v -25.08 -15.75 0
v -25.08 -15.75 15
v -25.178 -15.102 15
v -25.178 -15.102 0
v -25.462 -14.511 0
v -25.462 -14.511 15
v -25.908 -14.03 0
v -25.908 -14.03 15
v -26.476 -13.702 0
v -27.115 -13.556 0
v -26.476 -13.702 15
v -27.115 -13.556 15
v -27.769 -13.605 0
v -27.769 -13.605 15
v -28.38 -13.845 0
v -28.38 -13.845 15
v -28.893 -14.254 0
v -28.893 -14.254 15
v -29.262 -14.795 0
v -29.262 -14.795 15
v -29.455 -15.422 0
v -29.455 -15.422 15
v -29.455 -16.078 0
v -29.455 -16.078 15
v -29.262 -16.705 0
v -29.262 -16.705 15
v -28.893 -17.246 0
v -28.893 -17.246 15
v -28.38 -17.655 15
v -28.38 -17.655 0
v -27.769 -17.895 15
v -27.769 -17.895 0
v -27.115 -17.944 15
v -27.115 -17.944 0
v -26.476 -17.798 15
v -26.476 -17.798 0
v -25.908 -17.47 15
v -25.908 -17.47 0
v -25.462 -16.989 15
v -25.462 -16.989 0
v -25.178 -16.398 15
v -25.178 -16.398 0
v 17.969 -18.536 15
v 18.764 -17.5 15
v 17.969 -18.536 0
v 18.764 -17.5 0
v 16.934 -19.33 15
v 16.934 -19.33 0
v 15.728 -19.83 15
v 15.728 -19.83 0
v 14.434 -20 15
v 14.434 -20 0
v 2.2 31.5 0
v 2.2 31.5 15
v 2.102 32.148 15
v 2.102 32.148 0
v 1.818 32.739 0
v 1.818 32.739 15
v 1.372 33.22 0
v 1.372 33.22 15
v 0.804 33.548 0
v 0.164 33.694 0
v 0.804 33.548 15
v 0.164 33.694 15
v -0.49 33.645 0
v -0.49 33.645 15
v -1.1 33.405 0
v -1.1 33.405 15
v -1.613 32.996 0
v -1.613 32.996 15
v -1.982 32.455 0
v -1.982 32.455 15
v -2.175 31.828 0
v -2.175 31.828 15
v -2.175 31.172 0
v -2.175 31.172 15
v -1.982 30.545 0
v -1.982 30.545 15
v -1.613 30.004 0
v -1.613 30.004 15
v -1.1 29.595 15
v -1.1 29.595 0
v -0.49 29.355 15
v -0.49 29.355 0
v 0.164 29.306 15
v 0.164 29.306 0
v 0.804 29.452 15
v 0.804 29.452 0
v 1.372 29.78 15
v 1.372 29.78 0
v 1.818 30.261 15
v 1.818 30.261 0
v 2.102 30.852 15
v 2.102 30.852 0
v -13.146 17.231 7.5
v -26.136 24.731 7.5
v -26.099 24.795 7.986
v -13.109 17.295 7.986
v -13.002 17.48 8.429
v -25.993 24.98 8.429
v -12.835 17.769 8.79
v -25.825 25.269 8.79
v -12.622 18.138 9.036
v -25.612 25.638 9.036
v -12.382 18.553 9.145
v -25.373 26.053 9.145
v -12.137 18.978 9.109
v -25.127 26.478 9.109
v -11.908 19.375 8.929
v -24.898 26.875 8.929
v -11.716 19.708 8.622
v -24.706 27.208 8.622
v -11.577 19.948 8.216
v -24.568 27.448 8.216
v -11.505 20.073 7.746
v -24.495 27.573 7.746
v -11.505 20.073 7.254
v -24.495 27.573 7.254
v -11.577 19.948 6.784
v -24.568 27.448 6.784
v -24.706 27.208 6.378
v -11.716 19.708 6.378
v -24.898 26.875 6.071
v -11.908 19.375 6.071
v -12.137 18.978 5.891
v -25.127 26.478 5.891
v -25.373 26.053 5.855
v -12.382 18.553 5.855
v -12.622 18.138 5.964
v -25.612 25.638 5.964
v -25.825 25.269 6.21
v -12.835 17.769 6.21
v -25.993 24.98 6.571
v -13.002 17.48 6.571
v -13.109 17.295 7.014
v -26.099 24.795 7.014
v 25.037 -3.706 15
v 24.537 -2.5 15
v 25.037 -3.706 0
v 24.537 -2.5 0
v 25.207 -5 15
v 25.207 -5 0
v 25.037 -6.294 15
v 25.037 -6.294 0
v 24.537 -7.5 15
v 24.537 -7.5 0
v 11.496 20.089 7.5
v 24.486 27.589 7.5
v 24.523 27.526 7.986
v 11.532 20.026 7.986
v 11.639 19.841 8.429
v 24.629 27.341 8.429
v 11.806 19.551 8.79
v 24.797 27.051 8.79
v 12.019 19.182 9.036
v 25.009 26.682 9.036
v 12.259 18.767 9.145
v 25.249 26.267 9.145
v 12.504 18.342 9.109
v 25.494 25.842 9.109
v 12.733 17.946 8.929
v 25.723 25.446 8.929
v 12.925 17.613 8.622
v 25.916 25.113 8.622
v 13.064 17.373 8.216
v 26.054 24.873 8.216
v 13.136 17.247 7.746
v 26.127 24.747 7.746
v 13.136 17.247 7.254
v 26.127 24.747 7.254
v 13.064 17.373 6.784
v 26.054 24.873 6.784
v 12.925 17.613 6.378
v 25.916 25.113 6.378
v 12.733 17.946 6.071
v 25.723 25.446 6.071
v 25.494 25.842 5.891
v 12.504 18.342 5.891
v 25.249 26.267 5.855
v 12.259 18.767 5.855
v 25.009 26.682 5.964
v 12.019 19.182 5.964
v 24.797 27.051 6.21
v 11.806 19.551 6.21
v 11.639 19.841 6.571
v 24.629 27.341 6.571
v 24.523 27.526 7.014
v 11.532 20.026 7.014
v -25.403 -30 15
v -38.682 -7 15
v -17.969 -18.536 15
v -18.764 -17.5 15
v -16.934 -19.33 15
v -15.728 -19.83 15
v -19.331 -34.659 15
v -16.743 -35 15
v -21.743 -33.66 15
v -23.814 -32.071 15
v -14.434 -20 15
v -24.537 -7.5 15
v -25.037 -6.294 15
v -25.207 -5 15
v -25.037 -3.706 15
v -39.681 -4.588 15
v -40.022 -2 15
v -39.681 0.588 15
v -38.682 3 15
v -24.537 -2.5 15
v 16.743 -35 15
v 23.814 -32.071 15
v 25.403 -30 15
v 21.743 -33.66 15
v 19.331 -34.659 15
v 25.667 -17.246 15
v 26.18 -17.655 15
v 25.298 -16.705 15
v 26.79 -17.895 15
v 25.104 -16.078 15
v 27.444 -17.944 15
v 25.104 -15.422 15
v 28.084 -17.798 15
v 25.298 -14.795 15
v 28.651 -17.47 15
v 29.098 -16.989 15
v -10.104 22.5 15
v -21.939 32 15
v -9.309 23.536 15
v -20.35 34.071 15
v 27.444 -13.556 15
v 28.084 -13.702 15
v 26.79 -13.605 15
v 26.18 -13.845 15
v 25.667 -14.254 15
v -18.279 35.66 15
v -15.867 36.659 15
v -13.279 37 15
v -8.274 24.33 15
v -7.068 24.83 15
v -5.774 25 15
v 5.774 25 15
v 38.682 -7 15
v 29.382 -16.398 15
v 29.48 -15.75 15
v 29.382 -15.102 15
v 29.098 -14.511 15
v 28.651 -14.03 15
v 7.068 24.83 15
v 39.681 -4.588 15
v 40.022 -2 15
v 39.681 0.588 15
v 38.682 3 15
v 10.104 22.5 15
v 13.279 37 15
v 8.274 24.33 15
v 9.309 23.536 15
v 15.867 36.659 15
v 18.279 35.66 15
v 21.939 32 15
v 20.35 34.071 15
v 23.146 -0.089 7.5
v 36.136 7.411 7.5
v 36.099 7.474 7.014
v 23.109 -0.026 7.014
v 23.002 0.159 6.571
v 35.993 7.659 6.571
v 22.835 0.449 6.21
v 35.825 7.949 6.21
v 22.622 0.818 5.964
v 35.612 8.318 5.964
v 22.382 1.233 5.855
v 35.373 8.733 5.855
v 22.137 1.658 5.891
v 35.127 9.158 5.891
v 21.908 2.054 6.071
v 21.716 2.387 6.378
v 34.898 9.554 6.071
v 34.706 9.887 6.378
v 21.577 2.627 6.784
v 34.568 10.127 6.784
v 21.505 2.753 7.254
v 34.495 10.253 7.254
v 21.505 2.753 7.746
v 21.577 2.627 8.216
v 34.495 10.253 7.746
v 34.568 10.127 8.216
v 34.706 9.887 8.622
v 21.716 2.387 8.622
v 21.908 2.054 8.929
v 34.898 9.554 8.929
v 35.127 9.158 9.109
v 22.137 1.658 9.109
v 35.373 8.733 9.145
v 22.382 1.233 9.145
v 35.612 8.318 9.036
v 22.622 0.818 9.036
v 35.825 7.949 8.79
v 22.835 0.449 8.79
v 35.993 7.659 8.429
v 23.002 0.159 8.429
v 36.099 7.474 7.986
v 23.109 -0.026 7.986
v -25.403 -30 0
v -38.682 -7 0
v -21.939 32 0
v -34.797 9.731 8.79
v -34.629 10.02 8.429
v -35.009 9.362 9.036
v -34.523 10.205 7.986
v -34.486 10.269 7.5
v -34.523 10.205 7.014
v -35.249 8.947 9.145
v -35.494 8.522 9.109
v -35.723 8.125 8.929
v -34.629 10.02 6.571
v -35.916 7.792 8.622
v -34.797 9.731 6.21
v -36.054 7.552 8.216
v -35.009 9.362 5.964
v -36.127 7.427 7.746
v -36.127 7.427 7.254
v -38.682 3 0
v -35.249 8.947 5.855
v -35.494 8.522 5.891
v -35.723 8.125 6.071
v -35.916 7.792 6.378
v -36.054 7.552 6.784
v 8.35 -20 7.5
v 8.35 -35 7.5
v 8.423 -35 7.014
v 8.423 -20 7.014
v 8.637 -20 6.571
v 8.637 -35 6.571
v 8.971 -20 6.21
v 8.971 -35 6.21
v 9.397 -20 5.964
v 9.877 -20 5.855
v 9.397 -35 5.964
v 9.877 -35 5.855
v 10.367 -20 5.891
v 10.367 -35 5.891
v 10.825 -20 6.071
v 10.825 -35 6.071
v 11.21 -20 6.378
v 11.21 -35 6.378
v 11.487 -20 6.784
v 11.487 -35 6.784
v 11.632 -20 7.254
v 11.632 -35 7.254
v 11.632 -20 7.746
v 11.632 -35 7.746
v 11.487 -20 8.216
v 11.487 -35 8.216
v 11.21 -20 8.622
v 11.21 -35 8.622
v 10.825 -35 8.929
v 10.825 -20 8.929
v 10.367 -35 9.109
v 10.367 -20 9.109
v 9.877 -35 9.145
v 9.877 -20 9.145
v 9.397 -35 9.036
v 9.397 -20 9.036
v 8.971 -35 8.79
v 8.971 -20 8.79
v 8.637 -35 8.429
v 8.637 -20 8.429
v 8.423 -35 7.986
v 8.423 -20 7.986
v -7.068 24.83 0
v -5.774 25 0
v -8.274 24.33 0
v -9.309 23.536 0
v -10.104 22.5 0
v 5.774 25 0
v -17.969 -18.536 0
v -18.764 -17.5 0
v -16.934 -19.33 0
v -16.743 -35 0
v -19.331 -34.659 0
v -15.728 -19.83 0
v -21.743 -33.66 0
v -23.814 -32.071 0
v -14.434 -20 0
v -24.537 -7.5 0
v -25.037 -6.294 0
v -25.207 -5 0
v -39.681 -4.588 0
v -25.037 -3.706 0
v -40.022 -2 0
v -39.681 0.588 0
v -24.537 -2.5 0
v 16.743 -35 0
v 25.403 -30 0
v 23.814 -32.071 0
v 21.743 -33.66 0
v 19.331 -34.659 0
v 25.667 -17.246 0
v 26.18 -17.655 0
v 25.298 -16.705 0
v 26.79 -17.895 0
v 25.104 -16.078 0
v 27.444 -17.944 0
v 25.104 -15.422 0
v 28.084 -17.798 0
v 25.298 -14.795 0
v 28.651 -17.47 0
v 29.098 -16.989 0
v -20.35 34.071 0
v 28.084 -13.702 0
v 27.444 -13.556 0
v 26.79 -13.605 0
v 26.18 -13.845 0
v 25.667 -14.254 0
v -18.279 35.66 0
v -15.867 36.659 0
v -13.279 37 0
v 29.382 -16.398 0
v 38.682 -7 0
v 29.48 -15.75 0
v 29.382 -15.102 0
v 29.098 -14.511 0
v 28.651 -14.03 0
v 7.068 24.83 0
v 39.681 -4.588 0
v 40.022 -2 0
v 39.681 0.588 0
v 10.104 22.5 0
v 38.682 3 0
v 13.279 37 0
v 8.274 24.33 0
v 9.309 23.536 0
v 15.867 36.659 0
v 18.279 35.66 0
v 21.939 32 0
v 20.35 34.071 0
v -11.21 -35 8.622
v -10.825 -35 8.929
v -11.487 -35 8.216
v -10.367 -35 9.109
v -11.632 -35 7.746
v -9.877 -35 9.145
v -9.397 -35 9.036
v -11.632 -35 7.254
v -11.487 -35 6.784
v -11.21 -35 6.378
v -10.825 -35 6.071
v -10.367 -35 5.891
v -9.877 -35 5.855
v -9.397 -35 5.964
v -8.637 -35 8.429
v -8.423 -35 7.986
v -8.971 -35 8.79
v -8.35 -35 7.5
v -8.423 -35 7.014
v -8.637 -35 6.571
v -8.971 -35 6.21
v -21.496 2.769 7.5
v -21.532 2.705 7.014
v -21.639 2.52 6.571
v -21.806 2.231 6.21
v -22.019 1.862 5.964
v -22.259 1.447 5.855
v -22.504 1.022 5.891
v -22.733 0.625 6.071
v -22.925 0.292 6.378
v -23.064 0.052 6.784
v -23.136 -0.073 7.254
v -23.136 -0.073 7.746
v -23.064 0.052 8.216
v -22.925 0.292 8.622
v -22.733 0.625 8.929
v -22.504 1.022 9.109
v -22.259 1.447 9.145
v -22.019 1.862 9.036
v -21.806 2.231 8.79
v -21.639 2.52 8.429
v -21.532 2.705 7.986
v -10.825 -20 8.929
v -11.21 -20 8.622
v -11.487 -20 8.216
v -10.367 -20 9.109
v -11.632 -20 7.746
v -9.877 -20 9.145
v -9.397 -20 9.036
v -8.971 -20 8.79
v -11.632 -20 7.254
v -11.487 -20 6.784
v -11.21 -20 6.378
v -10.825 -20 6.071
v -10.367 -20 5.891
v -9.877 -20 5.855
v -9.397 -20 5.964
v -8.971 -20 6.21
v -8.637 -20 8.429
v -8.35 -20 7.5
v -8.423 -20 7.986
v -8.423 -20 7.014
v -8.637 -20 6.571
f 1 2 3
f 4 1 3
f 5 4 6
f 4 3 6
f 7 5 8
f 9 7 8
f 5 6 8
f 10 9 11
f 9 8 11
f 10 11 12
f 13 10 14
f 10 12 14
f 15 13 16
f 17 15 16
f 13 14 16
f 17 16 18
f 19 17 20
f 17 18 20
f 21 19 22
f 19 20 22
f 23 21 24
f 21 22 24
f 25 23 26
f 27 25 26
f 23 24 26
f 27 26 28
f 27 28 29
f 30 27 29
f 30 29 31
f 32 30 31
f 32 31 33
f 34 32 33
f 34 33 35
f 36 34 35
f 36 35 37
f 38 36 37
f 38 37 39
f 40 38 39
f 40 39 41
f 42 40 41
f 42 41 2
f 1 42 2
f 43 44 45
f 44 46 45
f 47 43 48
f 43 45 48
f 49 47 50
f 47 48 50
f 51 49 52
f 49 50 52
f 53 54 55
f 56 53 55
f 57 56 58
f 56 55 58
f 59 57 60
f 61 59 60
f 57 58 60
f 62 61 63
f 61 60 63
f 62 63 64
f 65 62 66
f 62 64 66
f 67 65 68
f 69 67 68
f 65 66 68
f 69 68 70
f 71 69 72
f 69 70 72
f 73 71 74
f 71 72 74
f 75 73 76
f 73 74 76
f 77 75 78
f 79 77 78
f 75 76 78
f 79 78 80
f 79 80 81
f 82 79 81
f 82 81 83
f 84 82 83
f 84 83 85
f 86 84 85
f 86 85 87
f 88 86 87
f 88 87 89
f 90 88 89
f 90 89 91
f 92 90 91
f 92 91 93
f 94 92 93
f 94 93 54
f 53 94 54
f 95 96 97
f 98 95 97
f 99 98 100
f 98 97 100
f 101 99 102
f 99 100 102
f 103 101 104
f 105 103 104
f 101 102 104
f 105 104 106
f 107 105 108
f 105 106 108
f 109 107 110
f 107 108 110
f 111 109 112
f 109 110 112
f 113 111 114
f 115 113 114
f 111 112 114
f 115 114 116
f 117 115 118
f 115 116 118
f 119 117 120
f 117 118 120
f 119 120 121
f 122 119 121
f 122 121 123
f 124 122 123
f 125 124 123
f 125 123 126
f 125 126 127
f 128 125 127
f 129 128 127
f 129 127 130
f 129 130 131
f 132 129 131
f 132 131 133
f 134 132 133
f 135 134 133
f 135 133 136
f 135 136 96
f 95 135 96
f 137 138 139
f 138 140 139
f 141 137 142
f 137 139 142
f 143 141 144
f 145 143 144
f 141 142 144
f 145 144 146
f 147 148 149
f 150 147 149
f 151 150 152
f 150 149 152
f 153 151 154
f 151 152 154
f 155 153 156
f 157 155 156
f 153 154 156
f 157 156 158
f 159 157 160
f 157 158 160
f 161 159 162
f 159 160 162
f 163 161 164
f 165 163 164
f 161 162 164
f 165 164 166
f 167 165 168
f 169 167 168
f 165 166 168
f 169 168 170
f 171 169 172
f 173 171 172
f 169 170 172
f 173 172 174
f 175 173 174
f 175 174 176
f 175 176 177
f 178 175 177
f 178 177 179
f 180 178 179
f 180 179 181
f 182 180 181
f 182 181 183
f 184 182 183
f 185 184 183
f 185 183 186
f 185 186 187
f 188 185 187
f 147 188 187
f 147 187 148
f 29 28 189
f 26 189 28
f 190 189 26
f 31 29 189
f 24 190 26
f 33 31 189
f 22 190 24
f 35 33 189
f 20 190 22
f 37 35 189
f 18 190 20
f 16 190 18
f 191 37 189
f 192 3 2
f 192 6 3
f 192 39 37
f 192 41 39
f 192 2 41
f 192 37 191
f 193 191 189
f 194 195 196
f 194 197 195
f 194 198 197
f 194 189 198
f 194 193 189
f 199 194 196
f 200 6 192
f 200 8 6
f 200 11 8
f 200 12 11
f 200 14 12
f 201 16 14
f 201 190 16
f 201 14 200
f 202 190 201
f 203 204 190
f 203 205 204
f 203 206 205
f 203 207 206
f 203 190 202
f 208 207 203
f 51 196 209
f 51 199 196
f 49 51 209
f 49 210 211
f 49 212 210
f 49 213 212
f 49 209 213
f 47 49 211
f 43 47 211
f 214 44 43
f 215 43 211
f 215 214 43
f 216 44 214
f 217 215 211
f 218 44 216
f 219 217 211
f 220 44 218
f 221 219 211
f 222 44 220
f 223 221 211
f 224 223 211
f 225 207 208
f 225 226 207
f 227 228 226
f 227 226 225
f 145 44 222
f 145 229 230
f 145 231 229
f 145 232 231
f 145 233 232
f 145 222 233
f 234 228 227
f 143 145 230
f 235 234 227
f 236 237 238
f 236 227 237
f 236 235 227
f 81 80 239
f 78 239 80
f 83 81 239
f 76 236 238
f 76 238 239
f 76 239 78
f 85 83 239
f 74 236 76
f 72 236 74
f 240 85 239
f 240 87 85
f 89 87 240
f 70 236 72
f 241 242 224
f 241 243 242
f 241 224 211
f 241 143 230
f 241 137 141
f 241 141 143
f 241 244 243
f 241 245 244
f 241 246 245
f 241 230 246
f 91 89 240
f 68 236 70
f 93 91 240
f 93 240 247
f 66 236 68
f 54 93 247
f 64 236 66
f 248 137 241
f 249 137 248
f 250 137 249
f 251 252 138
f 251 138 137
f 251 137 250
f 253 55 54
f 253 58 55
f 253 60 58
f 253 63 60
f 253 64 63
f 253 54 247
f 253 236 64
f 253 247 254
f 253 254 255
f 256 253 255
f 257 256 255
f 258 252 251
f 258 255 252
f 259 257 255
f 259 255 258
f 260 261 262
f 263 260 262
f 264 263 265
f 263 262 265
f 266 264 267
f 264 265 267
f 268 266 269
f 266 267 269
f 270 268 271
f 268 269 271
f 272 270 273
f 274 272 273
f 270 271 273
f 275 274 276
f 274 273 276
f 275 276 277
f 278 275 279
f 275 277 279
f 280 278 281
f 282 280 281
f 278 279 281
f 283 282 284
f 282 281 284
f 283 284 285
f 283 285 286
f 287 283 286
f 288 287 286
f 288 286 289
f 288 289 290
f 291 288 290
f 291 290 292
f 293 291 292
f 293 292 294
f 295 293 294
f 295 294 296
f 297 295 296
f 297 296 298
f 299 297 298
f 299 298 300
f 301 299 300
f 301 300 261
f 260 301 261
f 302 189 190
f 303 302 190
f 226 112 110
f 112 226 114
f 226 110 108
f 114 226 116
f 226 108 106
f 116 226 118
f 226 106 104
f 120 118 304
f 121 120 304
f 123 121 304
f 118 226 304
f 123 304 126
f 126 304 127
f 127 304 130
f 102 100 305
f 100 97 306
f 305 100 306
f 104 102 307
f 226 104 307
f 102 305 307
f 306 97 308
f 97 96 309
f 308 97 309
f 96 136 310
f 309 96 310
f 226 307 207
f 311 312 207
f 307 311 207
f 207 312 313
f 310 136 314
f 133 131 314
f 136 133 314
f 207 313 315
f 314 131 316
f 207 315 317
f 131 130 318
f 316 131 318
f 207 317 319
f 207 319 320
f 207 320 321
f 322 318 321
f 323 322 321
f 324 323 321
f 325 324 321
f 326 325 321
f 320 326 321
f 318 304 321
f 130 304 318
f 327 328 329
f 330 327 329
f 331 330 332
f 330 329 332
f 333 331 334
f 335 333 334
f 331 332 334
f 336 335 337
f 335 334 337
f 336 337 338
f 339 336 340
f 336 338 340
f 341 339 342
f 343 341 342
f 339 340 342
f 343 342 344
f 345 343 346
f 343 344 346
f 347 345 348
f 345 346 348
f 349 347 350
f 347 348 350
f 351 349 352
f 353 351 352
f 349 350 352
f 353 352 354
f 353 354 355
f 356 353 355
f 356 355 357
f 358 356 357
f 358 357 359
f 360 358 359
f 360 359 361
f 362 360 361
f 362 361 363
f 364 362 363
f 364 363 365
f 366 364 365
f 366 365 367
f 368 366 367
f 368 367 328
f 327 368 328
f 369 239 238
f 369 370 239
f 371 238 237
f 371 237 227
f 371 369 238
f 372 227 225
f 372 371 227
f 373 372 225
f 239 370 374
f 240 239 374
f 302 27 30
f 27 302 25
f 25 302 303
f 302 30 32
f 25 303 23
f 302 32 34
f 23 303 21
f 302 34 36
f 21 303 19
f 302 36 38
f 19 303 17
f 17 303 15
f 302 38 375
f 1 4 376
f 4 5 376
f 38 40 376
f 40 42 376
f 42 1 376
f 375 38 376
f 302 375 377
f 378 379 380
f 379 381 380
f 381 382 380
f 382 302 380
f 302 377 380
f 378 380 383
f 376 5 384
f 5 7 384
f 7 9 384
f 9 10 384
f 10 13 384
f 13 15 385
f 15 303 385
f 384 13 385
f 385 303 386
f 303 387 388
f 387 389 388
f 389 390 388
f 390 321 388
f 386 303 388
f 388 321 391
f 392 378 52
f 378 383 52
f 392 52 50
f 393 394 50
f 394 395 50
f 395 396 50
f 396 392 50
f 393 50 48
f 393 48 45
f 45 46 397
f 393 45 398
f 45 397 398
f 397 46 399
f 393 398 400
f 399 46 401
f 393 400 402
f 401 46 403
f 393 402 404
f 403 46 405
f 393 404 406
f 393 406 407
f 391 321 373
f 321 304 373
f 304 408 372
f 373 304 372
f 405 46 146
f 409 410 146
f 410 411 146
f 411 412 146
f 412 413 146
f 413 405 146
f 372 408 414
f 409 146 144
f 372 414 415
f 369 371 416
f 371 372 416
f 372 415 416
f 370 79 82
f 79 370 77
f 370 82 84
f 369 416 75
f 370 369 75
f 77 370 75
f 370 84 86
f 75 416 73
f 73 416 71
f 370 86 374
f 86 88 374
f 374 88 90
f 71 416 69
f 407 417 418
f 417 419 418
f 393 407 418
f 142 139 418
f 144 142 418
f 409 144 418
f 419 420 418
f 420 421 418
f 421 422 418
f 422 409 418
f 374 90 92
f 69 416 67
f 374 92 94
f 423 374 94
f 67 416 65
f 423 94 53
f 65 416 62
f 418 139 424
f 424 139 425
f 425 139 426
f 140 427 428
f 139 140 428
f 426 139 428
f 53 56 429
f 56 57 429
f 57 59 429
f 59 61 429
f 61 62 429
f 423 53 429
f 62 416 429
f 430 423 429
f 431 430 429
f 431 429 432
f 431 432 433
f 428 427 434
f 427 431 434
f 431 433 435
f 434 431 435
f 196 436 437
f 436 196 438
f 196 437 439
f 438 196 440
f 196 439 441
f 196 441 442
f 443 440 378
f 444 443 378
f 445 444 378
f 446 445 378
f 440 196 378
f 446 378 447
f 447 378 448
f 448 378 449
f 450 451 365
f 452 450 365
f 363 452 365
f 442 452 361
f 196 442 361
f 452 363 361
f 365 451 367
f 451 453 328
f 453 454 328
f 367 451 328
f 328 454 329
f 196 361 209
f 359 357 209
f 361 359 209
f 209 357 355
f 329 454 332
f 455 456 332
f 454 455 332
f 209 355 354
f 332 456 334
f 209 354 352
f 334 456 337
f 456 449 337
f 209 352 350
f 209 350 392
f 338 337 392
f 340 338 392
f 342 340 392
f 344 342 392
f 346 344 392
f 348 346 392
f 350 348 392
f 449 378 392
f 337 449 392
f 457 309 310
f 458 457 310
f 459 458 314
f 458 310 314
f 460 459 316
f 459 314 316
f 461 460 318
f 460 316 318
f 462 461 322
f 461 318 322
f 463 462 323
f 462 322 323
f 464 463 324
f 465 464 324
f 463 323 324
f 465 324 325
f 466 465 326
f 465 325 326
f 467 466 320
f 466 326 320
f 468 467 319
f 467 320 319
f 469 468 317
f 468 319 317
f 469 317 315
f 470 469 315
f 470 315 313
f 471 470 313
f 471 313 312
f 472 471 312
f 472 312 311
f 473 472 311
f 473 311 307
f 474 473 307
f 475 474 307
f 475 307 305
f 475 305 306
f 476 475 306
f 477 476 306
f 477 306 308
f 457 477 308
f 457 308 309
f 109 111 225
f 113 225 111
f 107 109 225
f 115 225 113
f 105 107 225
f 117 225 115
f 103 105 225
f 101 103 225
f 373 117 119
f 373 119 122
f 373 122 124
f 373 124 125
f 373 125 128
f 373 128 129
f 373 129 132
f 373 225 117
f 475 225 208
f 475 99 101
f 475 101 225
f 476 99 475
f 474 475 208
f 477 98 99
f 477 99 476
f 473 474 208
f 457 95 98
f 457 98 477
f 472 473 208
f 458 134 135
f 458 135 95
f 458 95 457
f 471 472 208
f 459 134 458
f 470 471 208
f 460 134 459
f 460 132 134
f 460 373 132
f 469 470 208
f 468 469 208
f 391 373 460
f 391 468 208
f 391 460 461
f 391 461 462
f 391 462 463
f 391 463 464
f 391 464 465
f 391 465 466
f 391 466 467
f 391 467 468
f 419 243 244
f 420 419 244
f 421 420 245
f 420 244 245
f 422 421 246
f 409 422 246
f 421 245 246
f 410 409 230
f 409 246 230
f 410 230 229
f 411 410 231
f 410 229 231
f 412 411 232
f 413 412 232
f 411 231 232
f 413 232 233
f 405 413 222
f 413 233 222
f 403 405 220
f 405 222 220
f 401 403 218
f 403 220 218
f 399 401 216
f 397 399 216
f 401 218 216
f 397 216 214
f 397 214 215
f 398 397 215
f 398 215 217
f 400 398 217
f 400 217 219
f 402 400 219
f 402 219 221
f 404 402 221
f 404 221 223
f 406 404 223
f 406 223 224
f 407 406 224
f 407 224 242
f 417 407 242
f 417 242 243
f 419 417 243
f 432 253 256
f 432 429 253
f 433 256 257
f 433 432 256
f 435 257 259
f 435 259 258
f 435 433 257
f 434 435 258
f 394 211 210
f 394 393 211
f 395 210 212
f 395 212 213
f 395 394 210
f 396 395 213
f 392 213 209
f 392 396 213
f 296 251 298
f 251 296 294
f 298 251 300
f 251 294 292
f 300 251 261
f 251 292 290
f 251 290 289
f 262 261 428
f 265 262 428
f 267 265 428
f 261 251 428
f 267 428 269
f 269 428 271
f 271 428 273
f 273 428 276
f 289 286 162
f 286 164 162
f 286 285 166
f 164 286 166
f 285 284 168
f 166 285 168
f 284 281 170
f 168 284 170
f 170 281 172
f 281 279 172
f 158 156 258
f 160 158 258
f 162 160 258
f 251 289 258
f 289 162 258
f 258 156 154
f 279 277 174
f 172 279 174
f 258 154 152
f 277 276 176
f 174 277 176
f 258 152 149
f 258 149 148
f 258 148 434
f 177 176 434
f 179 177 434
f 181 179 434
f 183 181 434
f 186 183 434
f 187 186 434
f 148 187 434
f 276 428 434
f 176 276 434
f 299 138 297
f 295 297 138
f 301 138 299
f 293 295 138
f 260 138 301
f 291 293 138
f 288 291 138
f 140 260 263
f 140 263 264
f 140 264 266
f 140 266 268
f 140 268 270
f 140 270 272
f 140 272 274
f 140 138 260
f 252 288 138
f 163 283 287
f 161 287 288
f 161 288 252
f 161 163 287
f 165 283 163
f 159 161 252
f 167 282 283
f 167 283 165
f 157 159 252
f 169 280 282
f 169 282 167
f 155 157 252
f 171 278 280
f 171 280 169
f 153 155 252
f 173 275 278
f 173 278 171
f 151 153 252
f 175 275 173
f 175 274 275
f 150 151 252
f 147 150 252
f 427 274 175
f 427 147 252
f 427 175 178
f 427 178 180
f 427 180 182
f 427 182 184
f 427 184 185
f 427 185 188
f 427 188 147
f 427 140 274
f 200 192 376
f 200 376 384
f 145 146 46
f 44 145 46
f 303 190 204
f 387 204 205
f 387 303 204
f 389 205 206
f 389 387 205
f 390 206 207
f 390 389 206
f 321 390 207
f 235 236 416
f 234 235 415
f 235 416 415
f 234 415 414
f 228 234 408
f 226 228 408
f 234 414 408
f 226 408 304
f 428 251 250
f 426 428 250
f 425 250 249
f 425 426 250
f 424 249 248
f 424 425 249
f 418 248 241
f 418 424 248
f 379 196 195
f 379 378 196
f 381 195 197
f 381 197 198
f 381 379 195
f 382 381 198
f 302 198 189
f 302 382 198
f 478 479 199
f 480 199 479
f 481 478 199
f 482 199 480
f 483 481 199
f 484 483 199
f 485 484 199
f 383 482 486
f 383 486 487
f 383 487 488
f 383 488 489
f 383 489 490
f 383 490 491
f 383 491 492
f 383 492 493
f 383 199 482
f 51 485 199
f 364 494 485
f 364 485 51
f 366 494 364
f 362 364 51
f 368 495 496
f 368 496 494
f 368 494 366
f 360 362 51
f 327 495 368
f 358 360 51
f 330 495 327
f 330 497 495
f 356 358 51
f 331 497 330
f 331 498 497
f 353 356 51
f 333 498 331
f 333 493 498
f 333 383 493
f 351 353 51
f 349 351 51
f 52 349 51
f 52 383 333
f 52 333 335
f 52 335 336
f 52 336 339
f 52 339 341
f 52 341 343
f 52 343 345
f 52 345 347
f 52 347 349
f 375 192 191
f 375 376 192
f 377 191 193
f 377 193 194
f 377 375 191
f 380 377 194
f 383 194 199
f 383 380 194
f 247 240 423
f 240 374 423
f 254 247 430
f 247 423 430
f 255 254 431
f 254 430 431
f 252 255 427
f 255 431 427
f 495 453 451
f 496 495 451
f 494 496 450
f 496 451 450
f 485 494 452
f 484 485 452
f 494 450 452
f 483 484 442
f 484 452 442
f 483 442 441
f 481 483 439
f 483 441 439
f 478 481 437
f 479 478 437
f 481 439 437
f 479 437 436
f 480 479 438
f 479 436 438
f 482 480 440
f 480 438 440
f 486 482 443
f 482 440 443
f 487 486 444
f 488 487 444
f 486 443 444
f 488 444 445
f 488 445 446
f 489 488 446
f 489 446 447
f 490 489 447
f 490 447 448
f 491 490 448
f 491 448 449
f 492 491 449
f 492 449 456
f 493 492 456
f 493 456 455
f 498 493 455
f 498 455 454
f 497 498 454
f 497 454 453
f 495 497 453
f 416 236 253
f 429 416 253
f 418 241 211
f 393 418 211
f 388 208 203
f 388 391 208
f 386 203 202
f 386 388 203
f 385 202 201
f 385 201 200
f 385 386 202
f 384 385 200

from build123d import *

# Parameters (mm, degrees)
EXTRUDE_1_DEPTH     = 15
FILLET_1_R          = 10
FILLET_2_R          = 5
SKETCH_2_R          = 1.65
CUT_EXTRUDE_1_DEPTH = 20
SKETCH_4_R          = 1.65
CUT_EXTRUDE_2_DEPTH = 20
SKETCH_5_R          = 1.65
CUT_EXTRUDE_3_DEPTH = 20
CUT_EXTRUDE_4_DEPTH = 15
EXTRUDE_2_DEPTH     = 15
CUT_EXTRUDE_5_DEPTH = 61.827625303
FILLET_3_R          = 10
FILLET_4_R          = 5
SKETCH_9_R          = 2.2
CUT_EXTRUDE_6_DEPTH = 57.531209197


with BuildPart() as part:
    # 草图1 → 凸台-拉伸1 (new body)
    with BuildSketch(Plane.XY):
        Polygon((0, 70), (-60.621778265, -35), (60.621778265, -35), align=None)
        Polygon((0, 40), (-34.641016151, -20), (34.641016151, -20), align=None, mode=Mode.SUBTRACT)
    extrude(amount=EXTRUDE_1_DEPTH)

    # 圆角1
    fillet_1_edges = [part.edges().sort_by_distance(p)[0] for p in [
        (60.621778265, -35, 7.5),
        (-60.621778265, -35, 7.5),
        (0, 70, 7.5),
    ]]
    fillet(fillet_1_edges, radius=FILLET_1_R)

    # 圆角2
    fillet_2_edges = [part.edges().sort_by_distance(p)[0] for p in [
        (34.641016151, -20, 7.5),
        (0, 40, 7.5),
        (-34.641016151, -20, 7.5),
    ]]
    fillet(fillet_2_edges, radius=FILLET_2_R)

    # 草图2 → 切除-拉伸1 (cut)
    with BuildSketch(Plane.XZ.offset(35)):
        with Locations((-10, 7.5)):
            Circle(SKETCH_2_R)
        with Locations(Location((10, 7.5, 0), (0, 0, 180))):
            Circle(SKETCH_2_R)
    extrude(amount=-CUT_EXTRUDE_1_DEPTH, mode=Mode.SUBTRACT)

    # 草图4 → 切除-拉伸2 (cut)
    with BuildSketch(Plane(origin=(30.310889132, 17.5, 0), x_dir=(0, 0, -1), z_dir=(0.8660254037844386, 0.5000000000000003, 0))):
        with Locations(Location((-7.5, 10, 0), (0, 0, 90))):
            Circle(SKETCH_4_R)
        with Locations(Location((-7.5, -10, 0), (0, 0, 270))):
            Circle(SKETCH_4_R)
    extrude(amount=-CUT_EXTRUDE_2_DEPTH, mode=Mode.SUBTRACT)

    # 草图5 → 切除-拉伸3 (cut)
    with BuildSketch(Plane(origin=(-30.310889132, 17.5, 0), x_dir=(0, 0, 1), z_dir=(-0.8660254037844386, 0.5000000000000003, 0))):
        with Locations(Location((7.5, 10, 0), (0, 0, 270))):
            Circle(SKETCH_5_R)
        with Locations(Location((7.5, -10, 0), (0, 0, 90))):
            Circle(SKETCH_5_R)
    extrude(amount=-CUT_EXTRUDE_3_DEPTH, mode=Mode.SUBTRACT)

    # 草图6 → 切除-拉伸4 (cut)
    with BuildSketch(Plane.XY.offset(15)):
        with BuildLine():
            Line((-8.660254038, 55), (-17.320508076, 40))
            Line((-17.320508076, 40), (17.320508076, 40))
            Line((17.320508076, 40), (8.660254038, 55))
            ThreePointArc((8.660254038, 55), (0, 60), (-8.660254038, 55))
        make_face()
        with BuildLine():
            Line((-25.980762114, -35), (-43.301270189, -5))
            Line((-43.301270189, -5), (-51.961524227, -20))
            ThreePointArc((-51.961524227, -20), (-51.961524227, -30), (-43.301270189, -35))
            Line((-43.301270189, -35), (-25.980762114, -35))
        make_face()
        with BuildLine():
            Line((51.961524227, -20), (43.301270189, -5))
            Line((43.301270189, -5), (25.980762114, -35))
            Line((25.980762114, -35), (43.301270189, -35))
            ThreePointArc((43.301270189, -35), (51.961524227, -30), (51.961524227, -20))
        make_face()
    extrude(amount=-CUT_EXTRUDE_4_DEPTH, mode=Mode.SUBTRACT)

    # 草图7 → 凸台-拉伸2 (add)
    with BuildSketch(Plane.XY.offset(15)):
        with BuildLine():
            Line((-4.330127019, 32.5), (-8.660254038, 25))
            Line((-8.660254038, 25), (8.660254038, 25))
            Line((8.660254038, 25), (4.330127019, 32.5))
            ThreePointArc((4.330127019, 32.5), (0, 35), (-4.330127019, 32.5))
        make_face()
        with BuildLine():
            Line((-17.320508076, -20), (-25.980762114, -5))
            Line((-25.980762114, -5), (-30.310889132, -12.5))
            ThreePointArc((-30.310889132, -12.5), (-30.310889132, -17.5), (-25.980762114, -20))
            Line((-25.980762114, -20), (-17.320508076, -20))
        make_face()
        with BuildLine():
            Line((30.310889132, -12.5), (25.980762114, -5))
            Line((25.980762114, -5), (17.320508076, -20))
            Line((17.320508076, -20), (25.980762114, -20))
            ThreePointArc((25.980762114, -20), (30.310889132, -17.5), (30.310889132, -12.5))
        make_face()
    extrude(amount=-EXTRUDE_2_DEPTH)

    # 草图8 → 切除-拉伸5 (cut, through all)
    with BuildSketch(Plane.XY.offset(15)):
        Polygon((-17.320508076, 40), (-19.052558883, 37), (19.052558883, 37), (17.320508076, 40), align=None)
        Polygon((-22.516660498, -35), (-41.569219382, -2), (-43.301270189, -5), (-25.980762114, -35), align=None)
        Polygon((43.301270189, -5), (41.569219382, -2), (22.516660498, -35), (25.980762114, -35), align=None)
    extrude(amount=-CUT_EXTRUDE_5_DEPTH, mode=Mode.SUBTRACT)

    # 圆角3
    fillet_3_edges = [part.edges().sort_by_distance(p)[0] for p in [
        (-19.052558883, 37, 7.5),
        (19.052558883, 37, 7.5),
        (-22.516660498, -35, 7.5),
        (-41.569219382, -2, 7.5),
        (41.569219382, -2, 7.5),
        (22.516660498, -35, 7.5),
    ]]
    fillet(fillet_3_edges, radius=FILLET_3_R)

    # 圆角4
    fillet_4_edges = [part.edges().sort_by_distance(p)[0] for p in [
        (-8.660254038, 25, 7.5),
        (8.660254038, 25, 7.5),
        (-17.320508076, -20, 7.5),
        (-25.980762114, -5, 7.5),
        (25.980762114, -5, 7.5),
        (17.320508076, -20, 7.5),
    ]]
    fillet(fillet_4_edges, radius=FILLET_4_R)

    # 草图9 → 切除-拉伸6 (cut, through all)
    with BuildSketch(Plane.XY.offset(15)):
        with Locations((0, 31.5)):
            Circle(SKETCH_9_R)
        with Locations((27.279800219, -15.75)):
            Circle(SKETCH_9_R)
        with Locations((-27.279800219, -15.75)):
            Circle(SKETCH_9_R)
    extrude(amount=-CUT_EXTRUDE_6_DEPTH, mode=Mode.SUBTRACT)


solid = part.part
